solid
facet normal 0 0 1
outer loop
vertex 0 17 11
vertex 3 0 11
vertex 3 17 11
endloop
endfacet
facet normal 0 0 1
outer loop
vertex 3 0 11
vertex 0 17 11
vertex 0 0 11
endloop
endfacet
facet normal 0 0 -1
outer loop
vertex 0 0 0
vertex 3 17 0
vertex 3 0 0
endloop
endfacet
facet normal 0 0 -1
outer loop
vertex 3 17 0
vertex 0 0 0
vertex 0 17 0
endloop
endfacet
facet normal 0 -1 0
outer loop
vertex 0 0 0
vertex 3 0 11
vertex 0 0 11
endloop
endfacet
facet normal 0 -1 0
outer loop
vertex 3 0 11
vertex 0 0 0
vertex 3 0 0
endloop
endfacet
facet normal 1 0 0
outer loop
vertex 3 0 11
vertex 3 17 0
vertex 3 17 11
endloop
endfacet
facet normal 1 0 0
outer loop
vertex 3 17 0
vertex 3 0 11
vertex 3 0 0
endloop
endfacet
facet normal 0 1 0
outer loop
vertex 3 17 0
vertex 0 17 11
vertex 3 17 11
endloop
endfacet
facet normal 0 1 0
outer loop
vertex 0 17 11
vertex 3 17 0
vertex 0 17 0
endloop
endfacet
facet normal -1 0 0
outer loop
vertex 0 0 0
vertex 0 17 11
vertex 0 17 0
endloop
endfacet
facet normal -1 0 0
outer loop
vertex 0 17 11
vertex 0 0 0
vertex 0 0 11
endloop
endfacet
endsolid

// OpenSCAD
// Generated by SolidPython 1.0.1 on 2020-07-29 00:46:54


cube(size = [3, 17, 11]);
/***********************************************
*********      SolidPython code:      **********
************************************************
 
# import packages: SolidPython
from solid import *
from solid.utils import *
from itertools import chain, combinations, permutations


class Resize:

    def __init__(self, scad_file):
        self.scad_file = scad_file
        #self.scad_file = import_scad(scad_file)
        # cone/cylinder param:
        self.r1 = 0
        self.r2 = 0
        self.h = 0
        # rectangular prism param:
        self.w = 0
        self.l = 0
        # ellipse param:
        self.r = 0

    # import OpenScad code (file name corresponds to shape)


    # classify shape + parameters
    def assign(self, param1, param2, param3):
        if self.scad_file == 'cone.scad':
            self.r1 = param1
            self.r2 = param2
            self.h = param3
        elif self.scad_file == 'cylinder.scad':
            self.r1 = param1
            self.r2 = param2
            self.h = param3
        elif self.scad_file == 'rectangularPrism.scad':
            self.h = param1
            self.l = param2
            self.w = param3
        else:
            self.r = param1
            self.h = param2

    # resize parameters
    def iterate(self):
        x = range(3, 20, 2)
        i = 1
        if self.scad_file == 'cone.scad':
            tempList = list(permutations(x, 2))
            for temp in tempList:
                param1 = temp[0]
                param2 = temp[1]
                filepath = 'produced_scad_files/' + 'cone' + str(param1) + '_' + str(param2) + '_' + '.scad'
                scad_render_to_file(cylinder(h=param1, r1=param2, r2=0), filepath)

        elif self.scad_file == 'cylinder.scad':
            tempList = list(permutations(x, 3))
            for temp in tempList:
                param1 = temp[0]
                param2 = temp[1]
                filepath = 'produced_scad_files/' + 'cylinder' + str(param1) + '_' + str(param2) + '_' + '.scad'
                scad_render_to_file(cylinder(h=param1, r1=param2, r2=param2), filepath)

        elif self.scad_file == 'rectangularPrism.scad':
            tempList = list(permutations(x, 3))
            for temp in tempList:
                param1 = temp[0]
                param2 = temp[1]
                param3 = temp[2]
                filepath = 'produced_scad_files/' + 'rectangularPrism' + str(param1) + '_' + str(param2) + '_' + str(
                    param3) + '.scad'
                scad_render_to_file(cube(size=(param1, param2, param3)), filepath)

        elif self.scad_file == 'ellipse.scad':
            tempList = list(permutations(x, 4))
            for temp in tempList:
                param1 = temp[0]
                param2 = temp[1]
                param3 = temp[2]
                param4 = temp[3]
                filepath = 'produced_scad_files/' + 'ellipse' + str(param1) + '_' + str(param2) + '_' + str(param3) + '_' + str(param4) + '.scad'
                scad_render_to_file(scale([param1, param2, param3])(sphere(r=param4)), filepath)

    def render_to_scadfile(self):
        scad_render_to_file(scad, 'example.scad') 
 
************************************************/
